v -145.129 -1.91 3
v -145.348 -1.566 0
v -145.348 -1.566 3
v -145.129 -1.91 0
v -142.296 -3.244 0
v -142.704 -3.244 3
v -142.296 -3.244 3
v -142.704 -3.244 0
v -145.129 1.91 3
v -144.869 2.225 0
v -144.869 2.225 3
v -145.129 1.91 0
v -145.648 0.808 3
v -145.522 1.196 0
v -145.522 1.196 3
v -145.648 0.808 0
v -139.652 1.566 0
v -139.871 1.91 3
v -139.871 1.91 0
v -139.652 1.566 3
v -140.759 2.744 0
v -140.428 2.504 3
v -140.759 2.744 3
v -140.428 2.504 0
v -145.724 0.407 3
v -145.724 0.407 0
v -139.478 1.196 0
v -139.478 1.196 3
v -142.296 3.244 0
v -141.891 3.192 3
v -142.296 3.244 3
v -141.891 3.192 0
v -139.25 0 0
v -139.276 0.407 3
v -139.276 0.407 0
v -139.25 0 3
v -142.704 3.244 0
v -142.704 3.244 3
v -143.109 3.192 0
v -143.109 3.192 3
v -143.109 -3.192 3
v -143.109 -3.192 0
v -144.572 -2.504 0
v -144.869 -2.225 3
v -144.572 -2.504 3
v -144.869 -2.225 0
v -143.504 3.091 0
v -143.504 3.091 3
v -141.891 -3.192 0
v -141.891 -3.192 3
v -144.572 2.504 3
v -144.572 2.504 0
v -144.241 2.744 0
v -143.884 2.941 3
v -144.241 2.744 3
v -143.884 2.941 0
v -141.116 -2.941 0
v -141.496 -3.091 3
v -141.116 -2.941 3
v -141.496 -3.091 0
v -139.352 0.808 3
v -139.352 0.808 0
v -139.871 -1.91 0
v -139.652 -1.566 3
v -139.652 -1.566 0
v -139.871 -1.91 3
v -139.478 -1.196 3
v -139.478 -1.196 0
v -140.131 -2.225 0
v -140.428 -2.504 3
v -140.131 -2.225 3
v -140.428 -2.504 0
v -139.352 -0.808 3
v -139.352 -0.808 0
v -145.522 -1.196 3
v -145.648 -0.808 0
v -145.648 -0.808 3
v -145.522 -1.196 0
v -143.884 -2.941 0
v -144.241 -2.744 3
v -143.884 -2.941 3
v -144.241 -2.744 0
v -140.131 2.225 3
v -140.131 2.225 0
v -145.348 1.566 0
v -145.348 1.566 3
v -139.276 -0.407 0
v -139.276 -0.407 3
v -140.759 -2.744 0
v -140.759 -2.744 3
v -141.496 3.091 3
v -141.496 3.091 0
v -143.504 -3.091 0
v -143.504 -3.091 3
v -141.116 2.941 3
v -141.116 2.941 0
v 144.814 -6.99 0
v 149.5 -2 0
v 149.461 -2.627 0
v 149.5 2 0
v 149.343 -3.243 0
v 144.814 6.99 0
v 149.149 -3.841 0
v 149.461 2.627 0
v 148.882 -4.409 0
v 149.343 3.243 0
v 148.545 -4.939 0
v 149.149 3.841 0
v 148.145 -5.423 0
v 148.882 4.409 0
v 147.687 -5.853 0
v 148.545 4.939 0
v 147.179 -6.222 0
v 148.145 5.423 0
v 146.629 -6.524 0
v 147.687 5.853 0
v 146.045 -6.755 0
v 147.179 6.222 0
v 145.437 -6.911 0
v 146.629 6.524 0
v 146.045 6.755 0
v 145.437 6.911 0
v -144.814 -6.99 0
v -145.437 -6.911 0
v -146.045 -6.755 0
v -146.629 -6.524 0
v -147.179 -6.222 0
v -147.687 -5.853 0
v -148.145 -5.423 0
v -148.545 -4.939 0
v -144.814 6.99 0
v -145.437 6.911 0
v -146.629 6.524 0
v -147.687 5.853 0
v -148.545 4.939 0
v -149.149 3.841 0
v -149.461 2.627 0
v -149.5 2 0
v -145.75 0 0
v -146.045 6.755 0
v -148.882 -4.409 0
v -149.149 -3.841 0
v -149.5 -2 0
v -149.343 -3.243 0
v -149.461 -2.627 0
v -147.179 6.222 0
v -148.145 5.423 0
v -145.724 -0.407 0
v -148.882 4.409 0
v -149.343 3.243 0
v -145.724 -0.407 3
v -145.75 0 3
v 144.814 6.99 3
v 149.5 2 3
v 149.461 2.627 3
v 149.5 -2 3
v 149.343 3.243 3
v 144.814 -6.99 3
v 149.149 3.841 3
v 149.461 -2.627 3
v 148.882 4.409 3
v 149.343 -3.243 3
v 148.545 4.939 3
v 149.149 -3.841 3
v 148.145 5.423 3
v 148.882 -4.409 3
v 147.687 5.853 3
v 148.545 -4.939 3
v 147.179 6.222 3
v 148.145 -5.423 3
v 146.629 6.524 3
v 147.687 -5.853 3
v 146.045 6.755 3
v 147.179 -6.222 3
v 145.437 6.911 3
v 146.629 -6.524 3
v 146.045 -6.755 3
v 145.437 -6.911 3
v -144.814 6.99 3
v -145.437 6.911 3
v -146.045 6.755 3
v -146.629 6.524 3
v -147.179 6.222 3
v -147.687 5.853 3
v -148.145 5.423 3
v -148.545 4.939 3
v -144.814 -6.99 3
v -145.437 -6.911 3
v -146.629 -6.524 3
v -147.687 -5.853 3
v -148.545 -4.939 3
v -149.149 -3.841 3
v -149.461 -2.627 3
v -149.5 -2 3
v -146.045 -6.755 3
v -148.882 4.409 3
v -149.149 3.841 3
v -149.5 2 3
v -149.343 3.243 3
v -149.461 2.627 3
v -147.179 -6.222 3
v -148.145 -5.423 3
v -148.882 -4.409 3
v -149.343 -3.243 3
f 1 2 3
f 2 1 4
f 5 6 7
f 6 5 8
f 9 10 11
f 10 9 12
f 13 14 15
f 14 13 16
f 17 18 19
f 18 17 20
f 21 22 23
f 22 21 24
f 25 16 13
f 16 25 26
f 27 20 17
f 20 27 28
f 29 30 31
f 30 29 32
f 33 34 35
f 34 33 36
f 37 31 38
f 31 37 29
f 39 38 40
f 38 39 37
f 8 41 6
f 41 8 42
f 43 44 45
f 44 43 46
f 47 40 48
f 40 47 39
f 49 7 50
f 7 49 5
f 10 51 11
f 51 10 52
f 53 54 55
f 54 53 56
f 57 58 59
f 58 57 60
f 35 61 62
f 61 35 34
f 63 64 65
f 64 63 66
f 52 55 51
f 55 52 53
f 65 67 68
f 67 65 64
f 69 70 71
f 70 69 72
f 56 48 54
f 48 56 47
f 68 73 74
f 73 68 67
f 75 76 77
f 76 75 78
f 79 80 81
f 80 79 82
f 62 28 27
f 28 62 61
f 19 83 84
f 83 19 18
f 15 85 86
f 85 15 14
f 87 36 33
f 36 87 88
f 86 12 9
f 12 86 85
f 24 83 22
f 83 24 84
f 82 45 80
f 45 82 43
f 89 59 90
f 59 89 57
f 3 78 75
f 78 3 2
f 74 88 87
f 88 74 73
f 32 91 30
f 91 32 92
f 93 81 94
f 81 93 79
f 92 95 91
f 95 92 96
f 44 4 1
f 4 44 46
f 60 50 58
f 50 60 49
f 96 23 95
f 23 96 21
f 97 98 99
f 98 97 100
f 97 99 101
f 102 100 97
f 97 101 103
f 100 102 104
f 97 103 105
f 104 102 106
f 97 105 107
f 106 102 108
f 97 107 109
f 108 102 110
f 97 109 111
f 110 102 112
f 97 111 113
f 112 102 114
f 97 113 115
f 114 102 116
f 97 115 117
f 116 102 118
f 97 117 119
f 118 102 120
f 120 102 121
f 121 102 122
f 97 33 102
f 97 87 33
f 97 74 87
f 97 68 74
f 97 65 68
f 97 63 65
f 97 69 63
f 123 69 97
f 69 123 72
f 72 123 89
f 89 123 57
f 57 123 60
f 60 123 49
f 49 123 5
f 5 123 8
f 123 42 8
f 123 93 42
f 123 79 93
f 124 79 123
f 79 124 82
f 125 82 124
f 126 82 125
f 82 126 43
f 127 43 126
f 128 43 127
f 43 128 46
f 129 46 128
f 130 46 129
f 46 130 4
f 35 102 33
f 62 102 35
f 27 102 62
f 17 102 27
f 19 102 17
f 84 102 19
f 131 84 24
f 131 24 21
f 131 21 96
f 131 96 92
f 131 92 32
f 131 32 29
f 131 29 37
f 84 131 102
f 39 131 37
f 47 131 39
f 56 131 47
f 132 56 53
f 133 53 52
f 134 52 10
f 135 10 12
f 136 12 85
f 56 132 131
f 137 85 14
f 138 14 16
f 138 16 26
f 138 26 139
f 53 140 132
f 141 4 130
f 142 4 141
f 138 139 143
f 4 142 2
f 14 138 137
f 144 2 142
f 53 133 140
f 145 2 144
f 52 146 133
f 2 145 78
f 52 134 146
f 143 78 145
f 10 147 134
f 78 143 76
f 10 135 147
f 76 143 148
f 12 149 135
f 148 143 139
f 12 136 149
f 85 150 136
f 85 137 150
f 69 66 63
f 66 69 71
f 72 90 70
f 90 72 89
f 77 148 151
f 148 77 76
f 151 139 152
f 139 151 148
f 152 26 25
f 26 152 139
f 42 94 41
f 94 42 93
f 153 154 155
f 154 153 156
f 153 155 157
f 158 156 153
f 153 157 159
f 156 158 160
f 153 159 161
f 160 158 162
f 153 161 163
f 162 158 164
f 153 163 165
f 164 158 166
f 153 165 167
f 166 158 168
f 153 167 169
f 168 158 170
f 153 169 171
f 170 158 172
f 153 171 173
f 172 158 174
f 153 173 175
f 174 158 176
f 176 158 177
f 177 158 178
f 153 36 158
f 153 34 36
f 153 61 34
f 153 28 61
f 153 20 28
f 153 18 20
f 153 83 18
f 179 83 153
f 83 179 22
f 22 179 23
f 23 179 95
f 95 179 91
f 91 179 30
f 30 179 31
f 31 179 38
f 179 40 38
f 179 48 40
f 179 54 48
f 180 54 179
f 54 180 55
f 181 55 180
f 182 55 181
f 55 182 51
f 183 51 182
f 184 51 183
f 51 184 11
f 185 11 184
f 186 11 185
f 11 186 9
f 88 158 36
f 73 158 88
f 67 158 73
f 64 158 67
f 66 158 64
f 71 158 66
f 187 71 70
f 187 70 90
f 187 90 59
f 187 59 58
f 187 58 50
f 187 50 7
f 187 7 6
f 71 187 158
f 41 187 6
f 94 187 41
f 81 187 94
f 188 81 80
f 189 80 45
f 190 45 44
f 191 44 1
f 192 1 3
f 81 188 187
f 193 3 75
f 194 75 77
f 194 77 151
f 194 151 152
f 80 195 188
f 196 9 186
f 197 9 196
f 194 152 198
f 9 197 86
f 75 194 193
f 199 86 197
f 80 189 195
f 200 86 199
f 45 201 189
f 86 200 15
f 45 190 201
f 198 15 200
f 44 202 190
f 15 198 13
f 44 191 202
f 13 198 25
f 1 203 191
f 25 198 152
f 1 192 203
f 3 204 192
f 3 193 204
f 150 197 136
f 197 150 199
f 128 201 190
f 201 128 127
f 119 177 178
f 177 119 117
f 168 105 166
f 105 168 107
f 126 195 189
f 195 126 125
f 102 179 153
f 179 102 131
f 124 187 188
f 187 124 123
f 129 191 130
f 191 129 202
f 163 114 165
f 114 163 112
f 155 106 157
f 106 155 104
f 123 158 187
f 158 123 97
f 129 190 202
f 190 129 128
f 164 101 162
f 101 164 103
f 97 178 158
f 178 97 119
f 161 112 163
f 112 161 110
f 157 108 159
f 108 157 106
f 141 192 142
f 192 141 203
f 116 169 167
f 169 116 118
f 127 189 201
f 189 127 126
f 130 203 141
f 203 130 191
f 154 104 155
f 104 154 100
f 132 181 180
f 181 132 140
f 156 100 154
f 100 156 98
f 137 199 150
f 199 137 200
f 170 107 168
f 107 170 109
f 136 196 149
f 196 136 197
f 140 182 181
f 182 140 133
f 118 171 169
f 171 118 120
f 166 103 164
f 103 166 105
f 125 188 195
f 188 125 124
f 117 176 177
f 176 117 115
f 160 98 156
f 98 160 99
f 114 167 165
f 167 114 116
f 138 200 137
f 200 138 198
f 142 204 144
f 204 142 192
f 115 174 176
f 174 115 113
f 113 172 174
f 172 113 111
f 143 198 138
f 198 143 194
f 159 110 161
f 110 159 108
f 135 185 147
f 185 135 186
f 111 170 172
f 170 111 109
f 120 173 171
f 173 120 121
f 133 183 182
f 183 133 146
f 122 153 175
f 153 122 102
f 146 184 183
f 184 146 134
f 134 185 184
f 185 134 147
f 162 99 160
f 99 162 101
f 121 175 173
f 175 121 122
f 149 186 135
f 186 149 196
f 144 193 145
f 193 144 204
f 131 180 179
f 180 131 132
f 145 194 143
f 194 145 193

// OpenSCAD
$fn = 50;


difference() {
	union() {
		hull() {
			translate(v = [-144.5000000000, 2.0000000000, 0]) {
				cylinder(h = 3, r = 5);
			}
			translate(v = [144.5000000000, 2.0000000000, 0]) {
				cylinder(h = 3, r = 5);
			}
			translate(v = [-144.5000000000, -2.0000000000, 0]) {
				cylinder(h = 3, r = 5);
			}
			translate(v = [144.5000000000, -2.0000000000, 0]) {
				cylinder(h = 3, r = 5);
			}
		}
	}
	union() {
		translate(v = [-142.5000000000, 0.0000000000, 0]) {
			cylinder(h = 3, r = 3.2500000000);
		}
		translate(v = [-142.5000000000, 0.0000000000, 0]) {
			cylinder(h = 3, r = 1.8000000000);
		}
		translate(v = [-142.5000000000, 0.0000000000, 0]) {
			cylinder(h = 3, r = 1.8000000000);
		}
		translate(v = [-142.5000000000, 0.0000000000, 0]) {
			cylinder(h = 3, r = 1.8000000000);
		}
	}
}
